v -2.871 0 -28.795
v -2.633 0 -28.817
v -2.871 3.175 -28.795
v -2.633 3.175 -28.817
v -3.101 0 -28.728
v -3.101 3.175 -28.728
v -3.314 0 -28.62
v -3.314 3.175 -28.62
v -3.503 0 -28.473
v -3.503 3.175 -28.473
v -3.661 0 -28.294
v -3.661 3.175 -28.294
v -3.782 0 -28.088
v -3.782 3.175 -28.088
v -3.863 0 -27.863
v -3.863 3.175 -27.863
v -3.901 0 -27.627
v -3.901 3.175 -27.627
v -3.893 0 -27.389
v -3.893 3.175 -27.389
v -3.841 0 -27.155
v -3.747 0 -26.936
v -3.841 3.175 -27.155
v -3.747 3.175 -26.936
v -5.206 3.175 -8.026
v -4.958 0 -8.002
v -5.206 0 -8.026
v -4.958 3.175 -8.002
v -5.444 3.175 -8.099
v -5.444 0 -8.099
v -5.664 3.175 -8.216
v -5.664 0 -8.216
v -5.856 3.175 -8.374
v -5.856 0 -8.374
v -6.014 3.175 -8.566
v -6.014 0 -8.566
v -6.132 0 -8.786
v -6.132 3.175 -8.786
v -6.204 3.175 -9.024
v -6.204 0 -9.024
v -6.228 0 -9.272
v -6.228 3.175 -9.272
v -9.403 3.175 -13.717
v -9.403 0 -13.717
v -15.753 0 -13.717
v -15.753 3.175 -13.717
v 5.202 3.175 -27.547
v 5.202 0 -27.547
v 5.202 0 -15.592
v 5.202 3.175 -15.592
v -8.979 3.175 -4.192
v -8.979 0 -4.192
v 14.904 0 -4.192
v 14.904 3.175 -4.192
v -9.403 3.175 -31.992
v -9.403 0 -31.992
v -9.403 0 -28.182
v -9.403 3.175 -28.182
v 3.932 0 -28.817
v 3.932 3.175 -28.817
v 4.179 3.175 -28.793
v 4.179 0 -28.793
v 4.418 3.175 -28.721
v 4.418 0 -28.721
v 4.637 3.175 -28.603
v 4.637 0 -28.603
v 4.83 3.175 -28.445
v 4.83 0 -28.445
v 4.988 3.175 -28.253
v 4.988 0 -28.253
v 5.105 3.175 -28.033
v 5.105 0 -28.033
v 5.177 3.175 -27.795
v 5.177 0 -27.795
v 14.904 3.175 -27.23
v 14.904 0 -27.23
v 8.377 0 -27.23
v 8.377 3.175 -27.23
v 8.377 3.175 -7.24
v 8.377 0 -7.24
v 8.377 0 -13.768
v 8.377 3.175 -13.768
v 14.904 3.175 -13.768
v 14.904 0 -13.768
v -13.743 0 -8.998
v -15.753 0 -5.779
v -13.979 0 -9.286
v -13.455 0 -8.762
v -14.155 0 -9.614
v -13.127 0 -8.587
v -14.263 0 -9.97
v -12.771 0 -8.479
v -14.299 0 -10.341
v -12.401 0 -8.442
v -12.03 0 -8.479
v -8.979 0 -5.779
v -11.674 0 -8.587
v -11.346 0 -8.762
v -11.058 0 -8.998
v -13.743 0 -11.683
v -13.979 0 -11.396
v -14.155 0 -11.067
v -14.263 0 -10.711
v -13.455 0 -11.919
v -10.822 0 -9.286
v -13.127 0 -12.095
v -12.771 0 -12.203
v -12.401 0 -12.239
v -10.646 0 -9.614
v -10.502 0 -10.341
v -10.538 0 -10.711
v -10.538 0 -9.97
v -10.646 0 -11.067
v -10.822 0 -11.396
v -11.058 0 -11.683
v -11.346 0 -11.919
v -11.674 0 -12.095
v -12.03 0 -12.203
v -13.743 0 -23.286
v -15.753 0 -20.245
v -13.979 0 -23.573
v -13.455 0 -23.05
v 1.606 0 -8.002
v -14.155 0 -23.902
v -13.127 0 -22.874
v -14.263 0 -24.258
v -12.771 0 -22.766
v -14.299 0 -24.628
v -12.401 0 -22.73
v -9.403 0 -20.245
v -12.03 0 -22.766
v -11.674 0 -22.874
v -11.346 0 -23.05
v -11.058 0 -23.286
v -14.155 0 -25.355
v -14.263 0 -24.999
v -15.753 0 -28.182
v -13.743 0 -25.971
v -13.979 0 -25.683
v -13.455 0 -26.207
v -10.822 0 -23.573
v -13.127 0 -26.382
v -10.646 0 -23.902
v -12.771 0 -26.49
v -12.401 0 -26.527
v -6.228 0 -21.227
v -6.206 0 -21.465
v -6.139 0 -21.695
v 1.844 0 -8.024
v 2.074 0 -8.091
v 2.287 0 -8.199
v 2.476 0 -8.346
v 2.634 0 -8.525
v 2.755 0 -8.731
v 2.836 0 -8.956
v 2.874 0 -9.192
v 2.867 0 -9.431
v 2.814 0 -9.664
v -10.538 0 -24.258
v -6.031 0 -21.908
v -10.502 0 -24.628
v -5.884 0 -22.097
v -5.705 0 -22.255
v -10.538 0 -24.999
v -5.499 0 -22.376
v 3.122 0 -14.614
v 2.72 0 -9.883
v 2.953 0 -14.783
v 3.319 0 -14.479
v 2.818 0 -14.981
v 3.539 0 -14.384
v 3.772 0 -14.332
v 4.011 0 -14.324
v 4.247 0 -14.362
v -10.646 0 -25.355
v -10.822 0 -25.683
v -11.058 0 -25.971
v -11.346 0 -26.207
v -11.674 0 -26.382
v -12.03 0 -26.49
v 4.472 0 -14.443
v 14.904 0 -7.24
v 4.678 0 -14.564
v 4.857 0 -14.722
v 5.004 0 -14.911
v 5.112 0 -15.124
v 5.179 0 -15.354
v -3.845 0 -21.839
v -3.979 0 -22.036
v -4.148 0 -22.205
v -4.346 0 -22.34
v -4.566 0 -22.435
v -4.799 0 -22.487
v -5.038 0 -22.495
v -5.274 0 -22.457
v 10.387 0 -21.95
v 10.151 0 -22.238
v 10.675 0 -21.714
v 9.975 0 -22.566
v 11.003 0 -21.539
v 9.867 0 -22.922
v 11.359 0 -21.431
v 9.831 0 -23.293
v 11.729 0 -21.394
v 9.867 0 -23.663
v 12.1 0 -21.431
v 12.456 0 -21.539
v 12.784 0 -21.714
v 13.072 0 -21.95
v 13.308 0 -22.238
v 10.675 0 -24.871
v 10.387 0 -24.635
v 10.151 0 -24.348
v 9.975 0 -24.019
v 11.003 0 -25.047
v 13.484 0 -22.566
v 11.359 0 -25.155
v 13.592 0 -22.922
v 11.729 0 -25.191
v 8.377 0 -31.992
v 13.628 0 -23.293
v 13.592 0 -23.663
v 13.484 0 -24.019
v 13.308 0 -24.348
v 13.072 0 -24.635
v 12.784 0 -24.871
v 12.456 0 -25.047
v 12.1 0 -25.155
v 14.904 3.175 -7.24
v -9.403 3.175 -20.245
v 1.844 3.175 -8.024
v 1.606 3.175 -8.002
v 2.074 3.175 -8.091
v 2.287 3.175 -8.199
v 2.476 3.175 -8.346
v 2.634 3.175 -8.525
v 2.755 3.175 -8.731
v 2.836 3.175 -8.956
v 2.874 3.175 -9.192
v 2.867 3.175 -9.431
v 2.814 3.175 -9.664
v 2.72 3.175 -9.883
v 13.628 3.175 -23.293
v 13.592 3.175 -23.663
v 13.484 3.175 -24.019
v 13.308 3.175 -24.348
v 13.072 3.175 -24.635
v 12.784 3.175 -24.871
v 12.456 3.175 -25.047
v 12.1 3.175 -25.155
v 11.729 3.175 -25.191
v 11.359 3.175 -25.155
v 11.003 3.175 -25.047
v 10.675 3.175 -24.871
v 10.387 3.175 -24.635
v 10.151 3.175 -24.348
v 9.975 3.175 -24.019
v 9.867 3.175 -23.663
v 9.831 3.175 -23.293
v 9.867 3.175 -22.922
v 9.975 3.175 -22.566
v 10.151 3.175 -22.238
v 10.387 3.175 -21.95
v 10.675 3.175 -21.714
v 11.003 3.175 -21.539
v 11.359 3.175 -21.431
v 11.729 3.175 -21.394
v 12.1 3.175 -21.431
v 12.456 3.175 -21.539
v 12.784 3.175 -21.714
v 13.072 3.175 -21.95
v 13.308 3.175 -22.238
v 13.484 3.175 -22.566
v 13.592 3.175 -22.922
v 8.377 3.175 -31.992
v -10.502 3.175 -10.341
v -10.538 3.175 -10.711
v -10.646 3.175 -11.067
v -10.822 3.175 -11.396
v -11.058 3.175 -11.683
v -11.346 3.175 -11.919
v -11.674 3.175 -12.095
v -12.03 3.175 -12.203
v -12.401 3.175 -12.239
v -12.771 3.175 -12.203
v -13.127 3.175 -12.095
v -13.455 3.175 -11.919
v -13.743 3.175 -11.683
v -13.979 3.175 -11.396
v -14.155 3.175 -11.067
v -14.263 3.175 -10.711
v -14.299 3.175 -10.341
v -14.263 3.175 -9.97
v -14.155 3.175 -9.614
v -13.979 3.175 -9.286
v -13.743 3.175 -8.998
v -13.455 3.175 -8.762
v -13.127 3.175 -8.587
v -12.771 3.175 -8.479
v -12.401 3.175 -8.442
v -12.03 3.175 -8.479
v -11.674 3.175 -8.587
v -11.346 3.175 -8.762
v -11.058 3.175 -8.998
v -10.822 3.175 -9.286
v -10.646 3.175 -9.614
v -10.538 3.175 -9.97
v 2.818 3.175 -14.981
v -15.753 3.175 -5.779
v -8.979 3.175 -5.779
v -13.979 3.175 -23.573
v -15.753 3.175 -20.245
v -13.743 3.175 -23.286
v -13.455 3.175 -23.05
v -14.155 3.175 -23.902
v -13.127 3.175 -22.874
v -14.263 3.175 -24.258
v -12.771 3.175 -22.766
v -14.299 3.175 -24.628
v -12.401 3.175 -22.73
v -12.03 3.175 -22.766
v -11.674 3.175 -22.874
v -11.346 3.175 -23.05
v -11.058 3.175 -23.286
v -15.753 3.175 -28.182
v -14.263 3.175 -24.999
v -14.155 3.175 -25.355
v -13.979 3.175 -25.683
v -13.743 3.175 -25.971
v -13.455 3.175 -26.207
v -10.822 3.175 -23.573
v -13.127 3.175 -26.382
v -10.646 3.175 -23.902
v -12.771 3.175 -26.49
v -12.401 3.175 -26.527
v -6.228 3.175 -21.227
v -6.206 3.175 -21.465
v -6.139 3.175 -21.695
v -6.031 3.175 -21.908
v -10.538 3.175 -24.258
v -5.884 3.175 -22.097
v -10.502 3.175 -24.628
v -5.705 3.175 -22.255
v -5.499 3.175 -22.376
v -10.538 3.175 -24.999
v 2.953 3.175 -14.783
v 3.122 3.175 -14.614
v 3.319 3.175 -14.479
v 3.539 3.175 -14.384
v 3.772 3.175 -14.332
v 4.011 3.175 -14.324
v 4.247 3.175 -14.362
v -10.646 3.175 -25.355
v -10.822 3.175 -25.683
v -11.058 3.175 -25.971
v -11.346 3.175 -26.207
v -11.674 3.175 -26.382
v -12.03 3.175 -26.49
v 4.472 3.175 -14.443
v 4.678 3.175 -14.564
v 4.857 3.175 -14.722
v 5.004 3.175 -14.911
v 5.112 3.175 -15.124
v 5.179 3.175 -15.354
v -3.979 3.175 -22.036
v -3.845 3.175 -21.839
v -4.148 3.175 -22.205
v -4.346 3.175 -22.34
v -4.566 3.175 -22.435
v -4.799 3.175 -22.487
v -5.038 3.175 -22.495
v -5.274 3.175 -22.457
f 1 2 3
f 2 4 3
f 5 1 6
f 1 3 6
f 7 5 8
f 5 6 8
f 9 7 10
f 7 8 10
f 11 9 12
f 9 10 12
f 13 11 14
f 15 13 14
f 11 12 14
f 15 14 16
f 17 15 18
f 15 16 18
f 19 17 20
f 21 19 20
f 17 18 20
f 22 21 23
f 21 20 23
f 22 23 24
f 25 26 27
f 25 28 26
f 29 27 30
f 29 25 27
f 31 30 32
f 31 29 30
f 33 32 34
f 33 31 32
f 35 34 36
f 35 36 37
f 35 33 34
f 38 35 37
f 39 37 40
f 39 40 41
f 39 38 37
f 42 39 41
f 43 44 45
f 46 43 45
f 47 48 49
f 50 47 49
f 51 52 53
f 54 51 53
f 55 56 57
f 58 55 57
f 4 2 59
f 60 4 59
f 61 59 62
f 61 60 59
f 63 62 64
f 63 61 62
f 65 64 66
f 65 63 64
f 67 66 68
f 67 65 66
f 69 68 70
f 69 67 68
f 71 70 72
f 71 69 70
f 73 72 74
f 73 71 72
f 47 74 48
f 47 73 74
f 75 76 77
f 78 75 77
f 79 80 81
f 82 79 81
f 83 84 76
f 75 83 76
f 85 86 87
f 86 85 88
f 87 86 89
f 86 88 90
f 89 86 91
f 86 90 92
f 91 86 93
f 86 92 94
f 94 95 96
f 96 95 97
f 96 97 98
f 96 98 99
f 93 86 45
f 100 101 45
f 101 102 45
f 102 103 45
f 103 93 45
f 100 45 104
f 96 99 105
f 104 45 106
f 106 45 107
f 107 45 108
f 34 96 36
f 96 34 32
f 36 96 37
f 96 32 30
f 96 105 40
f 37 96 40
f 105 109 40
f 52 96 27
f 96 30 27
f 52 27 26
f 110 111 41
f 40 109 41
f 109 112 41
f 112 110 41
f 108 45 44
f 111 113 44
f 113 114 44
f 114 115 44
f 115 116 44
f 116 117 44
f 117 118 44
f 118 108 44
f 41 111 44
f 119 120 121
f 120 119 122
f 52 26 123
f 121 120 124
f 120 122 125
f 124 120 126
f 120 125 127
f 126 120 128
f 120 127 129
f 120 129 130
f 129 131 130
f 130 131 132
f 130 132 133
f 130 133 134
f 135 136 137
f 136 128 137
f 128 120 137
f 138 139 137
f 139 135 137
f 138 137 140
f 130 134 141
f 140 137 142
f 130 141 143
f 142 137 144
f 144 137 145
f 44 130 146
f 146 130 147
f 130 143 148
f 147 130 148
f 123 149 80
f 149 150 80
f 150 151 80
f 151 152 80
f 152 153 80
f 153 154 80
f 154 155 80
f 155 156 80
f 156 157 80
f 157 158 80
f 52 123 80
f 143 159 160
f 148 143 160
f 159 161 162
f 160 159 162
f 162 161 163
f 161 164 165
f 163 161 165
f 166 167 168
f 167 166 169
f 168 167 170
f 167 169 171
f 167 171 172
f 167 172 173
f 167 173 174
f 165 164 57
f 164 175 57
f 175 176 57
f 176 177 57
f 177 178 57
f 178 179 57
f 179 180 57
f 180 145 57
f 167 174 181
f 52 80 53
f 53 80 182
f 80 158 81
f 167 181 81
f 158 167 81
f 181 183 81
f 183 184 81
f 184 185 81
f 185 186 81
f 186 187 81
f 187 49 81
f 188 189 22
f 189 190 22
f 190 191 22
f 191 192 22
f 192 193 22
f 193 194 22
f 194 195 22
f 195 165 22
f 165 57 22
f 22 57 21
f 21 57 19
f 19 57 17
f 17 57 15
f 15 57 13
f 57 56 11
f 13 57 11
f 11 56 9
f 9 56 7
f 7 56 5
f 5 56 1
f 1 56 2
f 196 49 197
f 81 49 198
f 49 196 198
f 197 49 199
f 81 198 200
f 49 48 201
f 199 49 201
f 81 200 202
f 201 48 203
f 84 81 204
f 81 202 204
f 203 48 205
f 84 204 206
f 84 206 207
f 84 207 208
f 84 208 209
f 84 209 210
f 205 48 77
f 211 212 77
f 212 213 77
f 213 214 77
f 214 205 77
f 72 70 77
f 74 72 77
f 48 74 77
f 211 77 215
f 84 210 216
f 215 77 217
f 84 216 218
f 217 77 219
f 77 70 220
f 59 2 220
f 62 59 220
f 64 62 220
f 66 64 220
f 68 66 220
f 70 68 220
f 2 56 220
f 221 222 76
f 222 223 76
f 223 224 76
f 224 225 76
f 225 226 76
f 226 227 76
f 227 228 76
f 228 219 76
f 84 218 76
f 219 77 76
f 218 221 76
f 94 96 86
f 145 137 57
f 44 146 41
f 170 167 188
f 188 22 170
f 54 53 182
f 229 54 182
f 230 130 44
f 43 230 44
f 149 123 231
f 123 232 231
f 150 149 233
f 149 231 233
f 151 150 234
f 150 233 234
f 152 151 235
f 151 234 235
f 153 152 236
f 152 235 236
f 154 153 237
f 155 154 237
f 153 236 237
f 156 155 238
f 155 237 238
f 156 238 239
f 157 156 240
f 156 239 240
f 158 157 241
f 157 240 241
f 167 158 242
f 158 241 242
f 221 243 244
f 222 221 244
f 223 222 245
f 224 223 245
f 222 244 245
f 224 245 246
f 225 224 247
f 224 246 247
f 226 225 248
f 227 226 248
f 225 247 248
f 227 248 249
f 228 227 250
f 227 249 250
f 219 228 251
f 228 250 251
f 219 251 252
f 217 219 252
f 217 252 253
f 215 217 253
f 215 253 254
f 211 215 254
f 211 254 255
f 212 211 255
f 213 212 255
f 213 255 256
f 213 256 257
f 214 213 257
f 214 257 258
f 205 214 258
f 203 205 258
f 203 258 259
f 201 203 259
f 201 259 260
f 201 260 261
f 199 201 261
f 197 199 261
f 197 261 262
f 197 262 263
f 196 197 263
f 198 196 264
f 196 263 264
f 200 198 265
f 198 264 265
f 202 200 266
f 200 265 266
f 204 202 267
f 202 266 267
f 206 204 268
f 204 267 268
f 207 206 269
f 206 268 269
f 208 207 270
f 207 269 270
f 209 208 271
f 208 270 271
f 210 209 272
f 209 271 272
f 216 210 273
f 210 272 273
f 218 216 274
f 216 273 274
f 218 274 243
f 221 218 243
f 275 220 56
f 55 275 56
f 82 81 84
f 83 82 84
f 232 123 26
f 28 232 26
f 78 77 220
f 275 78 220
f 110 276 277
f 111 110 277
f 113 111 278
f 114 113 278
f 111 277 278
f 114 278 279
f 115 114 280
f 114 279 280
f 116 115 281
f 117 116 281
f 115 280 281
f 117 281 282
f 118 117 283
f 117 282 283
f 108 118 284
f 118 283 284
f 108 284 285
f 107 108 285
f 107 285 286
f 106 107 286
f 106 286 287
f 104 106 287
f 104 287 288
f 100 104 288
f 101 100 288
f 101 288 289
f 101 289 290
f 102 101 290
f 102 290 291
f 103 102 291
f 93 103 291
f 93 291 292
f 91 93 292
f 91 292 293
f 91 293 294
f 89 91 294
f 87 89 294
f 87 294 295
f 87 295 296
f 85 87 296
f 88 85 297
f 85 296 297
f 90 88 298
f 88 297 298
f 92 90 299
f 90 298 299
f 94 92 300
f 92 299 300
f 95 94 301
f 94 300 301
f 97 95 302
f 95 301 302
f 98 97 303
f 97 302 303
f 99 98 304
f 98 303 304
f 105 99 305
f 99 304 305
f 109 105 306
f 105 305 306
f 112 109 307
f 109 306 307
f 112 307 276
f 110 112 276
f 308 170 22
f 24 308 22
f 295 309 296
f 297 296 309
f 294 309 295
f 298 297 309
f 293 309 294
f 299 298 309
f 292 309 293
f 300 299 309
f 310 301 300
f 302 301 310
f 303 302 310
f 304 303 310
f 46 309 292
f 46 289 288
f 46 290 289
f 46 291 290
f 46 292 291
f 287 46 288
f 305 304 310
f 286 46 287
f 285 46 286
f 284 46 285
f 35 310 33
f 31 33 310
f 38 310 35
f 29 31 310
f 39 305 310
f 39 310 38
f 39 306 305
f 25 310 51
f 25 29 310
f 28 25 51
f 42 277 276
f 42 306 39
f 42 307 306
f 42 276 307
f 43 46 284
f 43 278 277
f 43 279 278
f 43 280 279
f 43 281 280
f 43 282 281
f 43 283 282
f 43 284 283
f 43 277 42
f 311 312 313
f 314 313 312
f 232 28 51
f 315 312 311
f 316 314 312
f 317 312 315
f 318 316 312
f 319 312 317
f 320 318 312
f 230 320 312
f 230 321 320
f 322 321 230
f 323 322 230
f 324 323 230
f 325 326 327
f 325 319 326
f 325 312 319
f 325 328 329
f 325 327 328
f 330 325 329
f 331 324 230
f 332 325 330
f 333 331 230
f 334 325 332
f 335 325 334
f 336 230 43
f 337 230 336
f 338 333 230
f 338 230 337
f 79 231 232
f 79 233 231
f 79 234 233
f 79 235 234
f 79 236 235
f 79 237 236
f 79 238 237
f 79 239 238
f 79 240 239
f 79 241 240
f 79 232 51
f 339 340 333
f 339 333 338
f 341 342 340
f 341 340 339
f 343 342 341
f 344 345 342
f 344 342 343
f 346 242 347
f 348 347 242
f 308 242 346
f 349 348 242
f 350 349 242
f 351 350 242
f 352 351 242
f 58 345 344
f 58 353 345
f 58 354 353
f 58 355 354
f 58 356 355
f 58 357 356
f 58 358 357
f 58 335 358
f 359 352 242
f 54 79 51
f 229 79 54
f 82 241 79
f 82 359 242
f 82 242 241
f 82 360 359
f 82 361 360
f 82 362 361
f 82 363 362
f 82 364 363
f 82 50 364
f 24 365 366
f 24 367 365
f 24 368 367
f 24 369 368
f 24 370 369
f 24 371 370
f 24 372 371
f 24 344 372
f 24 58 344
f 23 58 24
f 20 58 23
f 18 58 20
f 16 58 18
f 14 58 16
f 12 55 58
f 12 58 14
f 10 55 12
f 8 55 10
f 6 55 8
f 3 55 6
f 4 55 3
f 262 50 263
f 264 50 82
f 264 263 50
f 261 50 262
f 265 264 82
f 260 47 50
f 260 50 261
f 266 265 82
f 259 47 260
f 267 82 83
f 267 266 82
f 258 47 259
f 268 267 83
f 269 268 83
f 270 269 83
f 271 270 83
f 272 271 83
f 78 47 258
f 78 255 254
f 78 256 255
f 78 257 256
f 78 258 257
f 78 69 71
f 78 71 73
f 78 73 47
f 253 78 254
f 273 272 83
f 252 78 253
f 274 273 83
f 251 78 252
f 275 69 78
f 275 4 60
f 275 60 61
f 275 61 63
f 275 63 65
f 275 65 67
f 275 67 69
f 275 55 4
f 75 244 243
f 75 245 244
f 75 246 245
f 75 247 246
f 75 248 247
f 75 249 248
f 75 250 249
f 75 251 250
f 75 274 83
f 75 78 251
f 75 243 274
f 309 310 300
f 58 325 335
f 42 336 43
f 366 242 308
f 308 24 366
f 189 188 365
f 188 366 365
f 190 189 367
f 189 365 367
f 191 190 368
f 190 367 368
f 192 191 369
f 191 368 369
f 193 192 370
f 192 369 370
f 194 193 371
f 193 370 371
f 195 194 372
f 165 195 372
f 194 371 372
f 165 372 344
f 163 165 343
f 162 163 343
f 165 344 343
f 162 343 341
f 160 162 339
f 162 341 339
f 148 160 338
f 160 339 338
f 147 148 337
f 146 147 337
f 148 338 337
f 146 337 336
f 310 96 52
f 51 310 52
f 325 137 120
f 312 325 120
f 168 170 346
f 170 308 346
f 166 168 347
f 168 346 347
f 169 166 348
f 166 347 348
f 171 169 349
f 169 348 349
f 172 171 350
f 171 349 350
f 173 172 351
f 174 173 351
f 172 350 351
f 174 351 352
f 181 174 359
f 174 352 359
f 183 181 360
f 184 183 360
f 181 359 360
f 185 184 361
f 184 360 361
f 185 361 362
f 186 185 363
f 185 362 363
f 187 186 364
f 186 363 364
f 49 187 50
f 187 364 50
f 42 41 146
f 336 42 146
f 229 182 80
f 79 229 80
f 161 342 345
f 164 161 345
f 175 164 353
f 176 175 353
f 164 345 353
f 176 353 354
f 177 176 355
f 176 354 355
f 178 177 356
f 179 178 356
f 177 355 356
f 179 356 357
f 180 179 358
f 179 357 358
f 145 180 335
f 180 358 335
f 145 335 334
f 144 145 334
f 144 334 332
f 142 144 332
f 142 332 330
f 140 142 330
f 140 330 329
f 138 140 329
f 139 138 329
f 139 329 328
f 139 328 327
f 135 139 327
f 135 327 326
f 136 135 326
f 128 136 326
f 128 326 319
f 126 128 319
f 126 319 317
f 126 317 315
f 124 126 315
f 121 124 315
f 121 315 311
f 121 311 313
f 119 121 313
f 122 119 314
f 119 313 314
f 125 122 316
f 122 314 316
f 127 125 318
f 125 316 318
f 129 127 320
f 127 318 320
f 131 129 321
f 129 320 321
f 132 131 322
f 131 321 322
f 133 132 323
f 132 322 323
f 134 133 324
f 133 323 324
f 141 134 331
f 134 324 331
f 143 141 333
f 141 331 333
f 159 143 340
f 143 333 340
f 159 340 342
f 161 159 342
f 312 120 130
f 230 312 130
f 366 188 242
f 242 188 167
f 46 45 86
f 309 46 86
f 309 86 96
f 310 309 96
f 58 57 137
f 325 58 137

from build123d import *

# Parameters (mm, degrees)
BOSS_EXTRUDE1_DEPTH       = 3.175
F_6_CLEARANCE_HOLE1_D     = 3.7973
F_6_CLEARANCE_HOLE1_DEPTH = 6.35
F_6_CLEARANCE_HOLE1_TIP   = 1.140824014
FILLET1_R                 = 1.27


with BuildPart() as part:
    # Sketch1 → Boss-Extrude1 (new body)
    with BuildSketch(Plane(origin=(0, 0, 0), x_dir=(1, 0, 0), z_dir=(0, 1, 0))):
        Polygon((-9.403419359, 20.244676918), (-9.403419359, 13.716876918), (-15.753419359, 13.716876918), (-15.753419359, 5.779376918), (-8.9789, 5.779376918), (-8.9789, 4.191876918), (14.904380641, 4.191876918), (14.904380641, 7.239876918), (8.376580641, 7.239876918), (8.376580641, 13.767676918), (14.904380641, 13.767676918), (14.904380641, 27.229676918), (8.376580641, 27.229676918), (8.376580641, 31.992176918), (-9.403419359, 31.992176918), (-9.403419359, 28.182176918), (-15.753419359, 28.182176918), (-15.753419359, 20.244676918), align=None)
        Polygon((-6.228419359, 8.001876918), (-6.228419359, 26.178617608), (3.752707316, 8.001876918), align=None, mode=Mode.SUBTRACT)
        Polygon((5.201580641, 28.817176918), (5.201580641, 10.640436229), (-4.779546034, 28.817176918), align=None, mode=Mode.SUBTRACT)
    extrude(amount=BOSS_EXTRUDE1_DEPTH)

    # 6 Clearance Hole1
    with Locations(Plane(origin=(11.855385862, 0, -6.482820987), x_dir=(-1, 0, 0), z_dir=(0, -1, 0))):
        with Locations((0.126005221, 16.809855931), (24.256005221, 18.145395592), (24.256005221, 3.857895592)):
            Hole(F_6_CLEARANCE_HOLE1_D / 2, depth=F_6_CLEARANCE_HOLE1_DEPTH)
            with Locations((0, 0, -(F_6_CLEARANCE_HOLE1_DEPTH + F_6_CLEARANCE_HOLE1_TIP / 2))):  # 118° drill point
                Cone(0, F_6_CLEARANCE_HOLE1_D / 2, F_6_CLEARANCE_HOLE1_TIP, mode=Mode.SUBTRACT)

    # Fillet1
    fillet1_edges = [part.edges().sort_by_distance(p)[0] for p in [
        (-6.228419359, 1.5875, -26.178617608),
        (-6.228419359, 1.5875, -8.001876918),
        (3.752707316, 1.5875, -8.001876918),
        (5.201580641, 1.5875, -10.640436229),
        (5.201580641, 1.5875, -28.817176918),
        (-4.779546034, 1.5875, -28.817176918),
    ]]
    fillet(fillet1_edges, radius=FILLET1_R)


solid = part.part
